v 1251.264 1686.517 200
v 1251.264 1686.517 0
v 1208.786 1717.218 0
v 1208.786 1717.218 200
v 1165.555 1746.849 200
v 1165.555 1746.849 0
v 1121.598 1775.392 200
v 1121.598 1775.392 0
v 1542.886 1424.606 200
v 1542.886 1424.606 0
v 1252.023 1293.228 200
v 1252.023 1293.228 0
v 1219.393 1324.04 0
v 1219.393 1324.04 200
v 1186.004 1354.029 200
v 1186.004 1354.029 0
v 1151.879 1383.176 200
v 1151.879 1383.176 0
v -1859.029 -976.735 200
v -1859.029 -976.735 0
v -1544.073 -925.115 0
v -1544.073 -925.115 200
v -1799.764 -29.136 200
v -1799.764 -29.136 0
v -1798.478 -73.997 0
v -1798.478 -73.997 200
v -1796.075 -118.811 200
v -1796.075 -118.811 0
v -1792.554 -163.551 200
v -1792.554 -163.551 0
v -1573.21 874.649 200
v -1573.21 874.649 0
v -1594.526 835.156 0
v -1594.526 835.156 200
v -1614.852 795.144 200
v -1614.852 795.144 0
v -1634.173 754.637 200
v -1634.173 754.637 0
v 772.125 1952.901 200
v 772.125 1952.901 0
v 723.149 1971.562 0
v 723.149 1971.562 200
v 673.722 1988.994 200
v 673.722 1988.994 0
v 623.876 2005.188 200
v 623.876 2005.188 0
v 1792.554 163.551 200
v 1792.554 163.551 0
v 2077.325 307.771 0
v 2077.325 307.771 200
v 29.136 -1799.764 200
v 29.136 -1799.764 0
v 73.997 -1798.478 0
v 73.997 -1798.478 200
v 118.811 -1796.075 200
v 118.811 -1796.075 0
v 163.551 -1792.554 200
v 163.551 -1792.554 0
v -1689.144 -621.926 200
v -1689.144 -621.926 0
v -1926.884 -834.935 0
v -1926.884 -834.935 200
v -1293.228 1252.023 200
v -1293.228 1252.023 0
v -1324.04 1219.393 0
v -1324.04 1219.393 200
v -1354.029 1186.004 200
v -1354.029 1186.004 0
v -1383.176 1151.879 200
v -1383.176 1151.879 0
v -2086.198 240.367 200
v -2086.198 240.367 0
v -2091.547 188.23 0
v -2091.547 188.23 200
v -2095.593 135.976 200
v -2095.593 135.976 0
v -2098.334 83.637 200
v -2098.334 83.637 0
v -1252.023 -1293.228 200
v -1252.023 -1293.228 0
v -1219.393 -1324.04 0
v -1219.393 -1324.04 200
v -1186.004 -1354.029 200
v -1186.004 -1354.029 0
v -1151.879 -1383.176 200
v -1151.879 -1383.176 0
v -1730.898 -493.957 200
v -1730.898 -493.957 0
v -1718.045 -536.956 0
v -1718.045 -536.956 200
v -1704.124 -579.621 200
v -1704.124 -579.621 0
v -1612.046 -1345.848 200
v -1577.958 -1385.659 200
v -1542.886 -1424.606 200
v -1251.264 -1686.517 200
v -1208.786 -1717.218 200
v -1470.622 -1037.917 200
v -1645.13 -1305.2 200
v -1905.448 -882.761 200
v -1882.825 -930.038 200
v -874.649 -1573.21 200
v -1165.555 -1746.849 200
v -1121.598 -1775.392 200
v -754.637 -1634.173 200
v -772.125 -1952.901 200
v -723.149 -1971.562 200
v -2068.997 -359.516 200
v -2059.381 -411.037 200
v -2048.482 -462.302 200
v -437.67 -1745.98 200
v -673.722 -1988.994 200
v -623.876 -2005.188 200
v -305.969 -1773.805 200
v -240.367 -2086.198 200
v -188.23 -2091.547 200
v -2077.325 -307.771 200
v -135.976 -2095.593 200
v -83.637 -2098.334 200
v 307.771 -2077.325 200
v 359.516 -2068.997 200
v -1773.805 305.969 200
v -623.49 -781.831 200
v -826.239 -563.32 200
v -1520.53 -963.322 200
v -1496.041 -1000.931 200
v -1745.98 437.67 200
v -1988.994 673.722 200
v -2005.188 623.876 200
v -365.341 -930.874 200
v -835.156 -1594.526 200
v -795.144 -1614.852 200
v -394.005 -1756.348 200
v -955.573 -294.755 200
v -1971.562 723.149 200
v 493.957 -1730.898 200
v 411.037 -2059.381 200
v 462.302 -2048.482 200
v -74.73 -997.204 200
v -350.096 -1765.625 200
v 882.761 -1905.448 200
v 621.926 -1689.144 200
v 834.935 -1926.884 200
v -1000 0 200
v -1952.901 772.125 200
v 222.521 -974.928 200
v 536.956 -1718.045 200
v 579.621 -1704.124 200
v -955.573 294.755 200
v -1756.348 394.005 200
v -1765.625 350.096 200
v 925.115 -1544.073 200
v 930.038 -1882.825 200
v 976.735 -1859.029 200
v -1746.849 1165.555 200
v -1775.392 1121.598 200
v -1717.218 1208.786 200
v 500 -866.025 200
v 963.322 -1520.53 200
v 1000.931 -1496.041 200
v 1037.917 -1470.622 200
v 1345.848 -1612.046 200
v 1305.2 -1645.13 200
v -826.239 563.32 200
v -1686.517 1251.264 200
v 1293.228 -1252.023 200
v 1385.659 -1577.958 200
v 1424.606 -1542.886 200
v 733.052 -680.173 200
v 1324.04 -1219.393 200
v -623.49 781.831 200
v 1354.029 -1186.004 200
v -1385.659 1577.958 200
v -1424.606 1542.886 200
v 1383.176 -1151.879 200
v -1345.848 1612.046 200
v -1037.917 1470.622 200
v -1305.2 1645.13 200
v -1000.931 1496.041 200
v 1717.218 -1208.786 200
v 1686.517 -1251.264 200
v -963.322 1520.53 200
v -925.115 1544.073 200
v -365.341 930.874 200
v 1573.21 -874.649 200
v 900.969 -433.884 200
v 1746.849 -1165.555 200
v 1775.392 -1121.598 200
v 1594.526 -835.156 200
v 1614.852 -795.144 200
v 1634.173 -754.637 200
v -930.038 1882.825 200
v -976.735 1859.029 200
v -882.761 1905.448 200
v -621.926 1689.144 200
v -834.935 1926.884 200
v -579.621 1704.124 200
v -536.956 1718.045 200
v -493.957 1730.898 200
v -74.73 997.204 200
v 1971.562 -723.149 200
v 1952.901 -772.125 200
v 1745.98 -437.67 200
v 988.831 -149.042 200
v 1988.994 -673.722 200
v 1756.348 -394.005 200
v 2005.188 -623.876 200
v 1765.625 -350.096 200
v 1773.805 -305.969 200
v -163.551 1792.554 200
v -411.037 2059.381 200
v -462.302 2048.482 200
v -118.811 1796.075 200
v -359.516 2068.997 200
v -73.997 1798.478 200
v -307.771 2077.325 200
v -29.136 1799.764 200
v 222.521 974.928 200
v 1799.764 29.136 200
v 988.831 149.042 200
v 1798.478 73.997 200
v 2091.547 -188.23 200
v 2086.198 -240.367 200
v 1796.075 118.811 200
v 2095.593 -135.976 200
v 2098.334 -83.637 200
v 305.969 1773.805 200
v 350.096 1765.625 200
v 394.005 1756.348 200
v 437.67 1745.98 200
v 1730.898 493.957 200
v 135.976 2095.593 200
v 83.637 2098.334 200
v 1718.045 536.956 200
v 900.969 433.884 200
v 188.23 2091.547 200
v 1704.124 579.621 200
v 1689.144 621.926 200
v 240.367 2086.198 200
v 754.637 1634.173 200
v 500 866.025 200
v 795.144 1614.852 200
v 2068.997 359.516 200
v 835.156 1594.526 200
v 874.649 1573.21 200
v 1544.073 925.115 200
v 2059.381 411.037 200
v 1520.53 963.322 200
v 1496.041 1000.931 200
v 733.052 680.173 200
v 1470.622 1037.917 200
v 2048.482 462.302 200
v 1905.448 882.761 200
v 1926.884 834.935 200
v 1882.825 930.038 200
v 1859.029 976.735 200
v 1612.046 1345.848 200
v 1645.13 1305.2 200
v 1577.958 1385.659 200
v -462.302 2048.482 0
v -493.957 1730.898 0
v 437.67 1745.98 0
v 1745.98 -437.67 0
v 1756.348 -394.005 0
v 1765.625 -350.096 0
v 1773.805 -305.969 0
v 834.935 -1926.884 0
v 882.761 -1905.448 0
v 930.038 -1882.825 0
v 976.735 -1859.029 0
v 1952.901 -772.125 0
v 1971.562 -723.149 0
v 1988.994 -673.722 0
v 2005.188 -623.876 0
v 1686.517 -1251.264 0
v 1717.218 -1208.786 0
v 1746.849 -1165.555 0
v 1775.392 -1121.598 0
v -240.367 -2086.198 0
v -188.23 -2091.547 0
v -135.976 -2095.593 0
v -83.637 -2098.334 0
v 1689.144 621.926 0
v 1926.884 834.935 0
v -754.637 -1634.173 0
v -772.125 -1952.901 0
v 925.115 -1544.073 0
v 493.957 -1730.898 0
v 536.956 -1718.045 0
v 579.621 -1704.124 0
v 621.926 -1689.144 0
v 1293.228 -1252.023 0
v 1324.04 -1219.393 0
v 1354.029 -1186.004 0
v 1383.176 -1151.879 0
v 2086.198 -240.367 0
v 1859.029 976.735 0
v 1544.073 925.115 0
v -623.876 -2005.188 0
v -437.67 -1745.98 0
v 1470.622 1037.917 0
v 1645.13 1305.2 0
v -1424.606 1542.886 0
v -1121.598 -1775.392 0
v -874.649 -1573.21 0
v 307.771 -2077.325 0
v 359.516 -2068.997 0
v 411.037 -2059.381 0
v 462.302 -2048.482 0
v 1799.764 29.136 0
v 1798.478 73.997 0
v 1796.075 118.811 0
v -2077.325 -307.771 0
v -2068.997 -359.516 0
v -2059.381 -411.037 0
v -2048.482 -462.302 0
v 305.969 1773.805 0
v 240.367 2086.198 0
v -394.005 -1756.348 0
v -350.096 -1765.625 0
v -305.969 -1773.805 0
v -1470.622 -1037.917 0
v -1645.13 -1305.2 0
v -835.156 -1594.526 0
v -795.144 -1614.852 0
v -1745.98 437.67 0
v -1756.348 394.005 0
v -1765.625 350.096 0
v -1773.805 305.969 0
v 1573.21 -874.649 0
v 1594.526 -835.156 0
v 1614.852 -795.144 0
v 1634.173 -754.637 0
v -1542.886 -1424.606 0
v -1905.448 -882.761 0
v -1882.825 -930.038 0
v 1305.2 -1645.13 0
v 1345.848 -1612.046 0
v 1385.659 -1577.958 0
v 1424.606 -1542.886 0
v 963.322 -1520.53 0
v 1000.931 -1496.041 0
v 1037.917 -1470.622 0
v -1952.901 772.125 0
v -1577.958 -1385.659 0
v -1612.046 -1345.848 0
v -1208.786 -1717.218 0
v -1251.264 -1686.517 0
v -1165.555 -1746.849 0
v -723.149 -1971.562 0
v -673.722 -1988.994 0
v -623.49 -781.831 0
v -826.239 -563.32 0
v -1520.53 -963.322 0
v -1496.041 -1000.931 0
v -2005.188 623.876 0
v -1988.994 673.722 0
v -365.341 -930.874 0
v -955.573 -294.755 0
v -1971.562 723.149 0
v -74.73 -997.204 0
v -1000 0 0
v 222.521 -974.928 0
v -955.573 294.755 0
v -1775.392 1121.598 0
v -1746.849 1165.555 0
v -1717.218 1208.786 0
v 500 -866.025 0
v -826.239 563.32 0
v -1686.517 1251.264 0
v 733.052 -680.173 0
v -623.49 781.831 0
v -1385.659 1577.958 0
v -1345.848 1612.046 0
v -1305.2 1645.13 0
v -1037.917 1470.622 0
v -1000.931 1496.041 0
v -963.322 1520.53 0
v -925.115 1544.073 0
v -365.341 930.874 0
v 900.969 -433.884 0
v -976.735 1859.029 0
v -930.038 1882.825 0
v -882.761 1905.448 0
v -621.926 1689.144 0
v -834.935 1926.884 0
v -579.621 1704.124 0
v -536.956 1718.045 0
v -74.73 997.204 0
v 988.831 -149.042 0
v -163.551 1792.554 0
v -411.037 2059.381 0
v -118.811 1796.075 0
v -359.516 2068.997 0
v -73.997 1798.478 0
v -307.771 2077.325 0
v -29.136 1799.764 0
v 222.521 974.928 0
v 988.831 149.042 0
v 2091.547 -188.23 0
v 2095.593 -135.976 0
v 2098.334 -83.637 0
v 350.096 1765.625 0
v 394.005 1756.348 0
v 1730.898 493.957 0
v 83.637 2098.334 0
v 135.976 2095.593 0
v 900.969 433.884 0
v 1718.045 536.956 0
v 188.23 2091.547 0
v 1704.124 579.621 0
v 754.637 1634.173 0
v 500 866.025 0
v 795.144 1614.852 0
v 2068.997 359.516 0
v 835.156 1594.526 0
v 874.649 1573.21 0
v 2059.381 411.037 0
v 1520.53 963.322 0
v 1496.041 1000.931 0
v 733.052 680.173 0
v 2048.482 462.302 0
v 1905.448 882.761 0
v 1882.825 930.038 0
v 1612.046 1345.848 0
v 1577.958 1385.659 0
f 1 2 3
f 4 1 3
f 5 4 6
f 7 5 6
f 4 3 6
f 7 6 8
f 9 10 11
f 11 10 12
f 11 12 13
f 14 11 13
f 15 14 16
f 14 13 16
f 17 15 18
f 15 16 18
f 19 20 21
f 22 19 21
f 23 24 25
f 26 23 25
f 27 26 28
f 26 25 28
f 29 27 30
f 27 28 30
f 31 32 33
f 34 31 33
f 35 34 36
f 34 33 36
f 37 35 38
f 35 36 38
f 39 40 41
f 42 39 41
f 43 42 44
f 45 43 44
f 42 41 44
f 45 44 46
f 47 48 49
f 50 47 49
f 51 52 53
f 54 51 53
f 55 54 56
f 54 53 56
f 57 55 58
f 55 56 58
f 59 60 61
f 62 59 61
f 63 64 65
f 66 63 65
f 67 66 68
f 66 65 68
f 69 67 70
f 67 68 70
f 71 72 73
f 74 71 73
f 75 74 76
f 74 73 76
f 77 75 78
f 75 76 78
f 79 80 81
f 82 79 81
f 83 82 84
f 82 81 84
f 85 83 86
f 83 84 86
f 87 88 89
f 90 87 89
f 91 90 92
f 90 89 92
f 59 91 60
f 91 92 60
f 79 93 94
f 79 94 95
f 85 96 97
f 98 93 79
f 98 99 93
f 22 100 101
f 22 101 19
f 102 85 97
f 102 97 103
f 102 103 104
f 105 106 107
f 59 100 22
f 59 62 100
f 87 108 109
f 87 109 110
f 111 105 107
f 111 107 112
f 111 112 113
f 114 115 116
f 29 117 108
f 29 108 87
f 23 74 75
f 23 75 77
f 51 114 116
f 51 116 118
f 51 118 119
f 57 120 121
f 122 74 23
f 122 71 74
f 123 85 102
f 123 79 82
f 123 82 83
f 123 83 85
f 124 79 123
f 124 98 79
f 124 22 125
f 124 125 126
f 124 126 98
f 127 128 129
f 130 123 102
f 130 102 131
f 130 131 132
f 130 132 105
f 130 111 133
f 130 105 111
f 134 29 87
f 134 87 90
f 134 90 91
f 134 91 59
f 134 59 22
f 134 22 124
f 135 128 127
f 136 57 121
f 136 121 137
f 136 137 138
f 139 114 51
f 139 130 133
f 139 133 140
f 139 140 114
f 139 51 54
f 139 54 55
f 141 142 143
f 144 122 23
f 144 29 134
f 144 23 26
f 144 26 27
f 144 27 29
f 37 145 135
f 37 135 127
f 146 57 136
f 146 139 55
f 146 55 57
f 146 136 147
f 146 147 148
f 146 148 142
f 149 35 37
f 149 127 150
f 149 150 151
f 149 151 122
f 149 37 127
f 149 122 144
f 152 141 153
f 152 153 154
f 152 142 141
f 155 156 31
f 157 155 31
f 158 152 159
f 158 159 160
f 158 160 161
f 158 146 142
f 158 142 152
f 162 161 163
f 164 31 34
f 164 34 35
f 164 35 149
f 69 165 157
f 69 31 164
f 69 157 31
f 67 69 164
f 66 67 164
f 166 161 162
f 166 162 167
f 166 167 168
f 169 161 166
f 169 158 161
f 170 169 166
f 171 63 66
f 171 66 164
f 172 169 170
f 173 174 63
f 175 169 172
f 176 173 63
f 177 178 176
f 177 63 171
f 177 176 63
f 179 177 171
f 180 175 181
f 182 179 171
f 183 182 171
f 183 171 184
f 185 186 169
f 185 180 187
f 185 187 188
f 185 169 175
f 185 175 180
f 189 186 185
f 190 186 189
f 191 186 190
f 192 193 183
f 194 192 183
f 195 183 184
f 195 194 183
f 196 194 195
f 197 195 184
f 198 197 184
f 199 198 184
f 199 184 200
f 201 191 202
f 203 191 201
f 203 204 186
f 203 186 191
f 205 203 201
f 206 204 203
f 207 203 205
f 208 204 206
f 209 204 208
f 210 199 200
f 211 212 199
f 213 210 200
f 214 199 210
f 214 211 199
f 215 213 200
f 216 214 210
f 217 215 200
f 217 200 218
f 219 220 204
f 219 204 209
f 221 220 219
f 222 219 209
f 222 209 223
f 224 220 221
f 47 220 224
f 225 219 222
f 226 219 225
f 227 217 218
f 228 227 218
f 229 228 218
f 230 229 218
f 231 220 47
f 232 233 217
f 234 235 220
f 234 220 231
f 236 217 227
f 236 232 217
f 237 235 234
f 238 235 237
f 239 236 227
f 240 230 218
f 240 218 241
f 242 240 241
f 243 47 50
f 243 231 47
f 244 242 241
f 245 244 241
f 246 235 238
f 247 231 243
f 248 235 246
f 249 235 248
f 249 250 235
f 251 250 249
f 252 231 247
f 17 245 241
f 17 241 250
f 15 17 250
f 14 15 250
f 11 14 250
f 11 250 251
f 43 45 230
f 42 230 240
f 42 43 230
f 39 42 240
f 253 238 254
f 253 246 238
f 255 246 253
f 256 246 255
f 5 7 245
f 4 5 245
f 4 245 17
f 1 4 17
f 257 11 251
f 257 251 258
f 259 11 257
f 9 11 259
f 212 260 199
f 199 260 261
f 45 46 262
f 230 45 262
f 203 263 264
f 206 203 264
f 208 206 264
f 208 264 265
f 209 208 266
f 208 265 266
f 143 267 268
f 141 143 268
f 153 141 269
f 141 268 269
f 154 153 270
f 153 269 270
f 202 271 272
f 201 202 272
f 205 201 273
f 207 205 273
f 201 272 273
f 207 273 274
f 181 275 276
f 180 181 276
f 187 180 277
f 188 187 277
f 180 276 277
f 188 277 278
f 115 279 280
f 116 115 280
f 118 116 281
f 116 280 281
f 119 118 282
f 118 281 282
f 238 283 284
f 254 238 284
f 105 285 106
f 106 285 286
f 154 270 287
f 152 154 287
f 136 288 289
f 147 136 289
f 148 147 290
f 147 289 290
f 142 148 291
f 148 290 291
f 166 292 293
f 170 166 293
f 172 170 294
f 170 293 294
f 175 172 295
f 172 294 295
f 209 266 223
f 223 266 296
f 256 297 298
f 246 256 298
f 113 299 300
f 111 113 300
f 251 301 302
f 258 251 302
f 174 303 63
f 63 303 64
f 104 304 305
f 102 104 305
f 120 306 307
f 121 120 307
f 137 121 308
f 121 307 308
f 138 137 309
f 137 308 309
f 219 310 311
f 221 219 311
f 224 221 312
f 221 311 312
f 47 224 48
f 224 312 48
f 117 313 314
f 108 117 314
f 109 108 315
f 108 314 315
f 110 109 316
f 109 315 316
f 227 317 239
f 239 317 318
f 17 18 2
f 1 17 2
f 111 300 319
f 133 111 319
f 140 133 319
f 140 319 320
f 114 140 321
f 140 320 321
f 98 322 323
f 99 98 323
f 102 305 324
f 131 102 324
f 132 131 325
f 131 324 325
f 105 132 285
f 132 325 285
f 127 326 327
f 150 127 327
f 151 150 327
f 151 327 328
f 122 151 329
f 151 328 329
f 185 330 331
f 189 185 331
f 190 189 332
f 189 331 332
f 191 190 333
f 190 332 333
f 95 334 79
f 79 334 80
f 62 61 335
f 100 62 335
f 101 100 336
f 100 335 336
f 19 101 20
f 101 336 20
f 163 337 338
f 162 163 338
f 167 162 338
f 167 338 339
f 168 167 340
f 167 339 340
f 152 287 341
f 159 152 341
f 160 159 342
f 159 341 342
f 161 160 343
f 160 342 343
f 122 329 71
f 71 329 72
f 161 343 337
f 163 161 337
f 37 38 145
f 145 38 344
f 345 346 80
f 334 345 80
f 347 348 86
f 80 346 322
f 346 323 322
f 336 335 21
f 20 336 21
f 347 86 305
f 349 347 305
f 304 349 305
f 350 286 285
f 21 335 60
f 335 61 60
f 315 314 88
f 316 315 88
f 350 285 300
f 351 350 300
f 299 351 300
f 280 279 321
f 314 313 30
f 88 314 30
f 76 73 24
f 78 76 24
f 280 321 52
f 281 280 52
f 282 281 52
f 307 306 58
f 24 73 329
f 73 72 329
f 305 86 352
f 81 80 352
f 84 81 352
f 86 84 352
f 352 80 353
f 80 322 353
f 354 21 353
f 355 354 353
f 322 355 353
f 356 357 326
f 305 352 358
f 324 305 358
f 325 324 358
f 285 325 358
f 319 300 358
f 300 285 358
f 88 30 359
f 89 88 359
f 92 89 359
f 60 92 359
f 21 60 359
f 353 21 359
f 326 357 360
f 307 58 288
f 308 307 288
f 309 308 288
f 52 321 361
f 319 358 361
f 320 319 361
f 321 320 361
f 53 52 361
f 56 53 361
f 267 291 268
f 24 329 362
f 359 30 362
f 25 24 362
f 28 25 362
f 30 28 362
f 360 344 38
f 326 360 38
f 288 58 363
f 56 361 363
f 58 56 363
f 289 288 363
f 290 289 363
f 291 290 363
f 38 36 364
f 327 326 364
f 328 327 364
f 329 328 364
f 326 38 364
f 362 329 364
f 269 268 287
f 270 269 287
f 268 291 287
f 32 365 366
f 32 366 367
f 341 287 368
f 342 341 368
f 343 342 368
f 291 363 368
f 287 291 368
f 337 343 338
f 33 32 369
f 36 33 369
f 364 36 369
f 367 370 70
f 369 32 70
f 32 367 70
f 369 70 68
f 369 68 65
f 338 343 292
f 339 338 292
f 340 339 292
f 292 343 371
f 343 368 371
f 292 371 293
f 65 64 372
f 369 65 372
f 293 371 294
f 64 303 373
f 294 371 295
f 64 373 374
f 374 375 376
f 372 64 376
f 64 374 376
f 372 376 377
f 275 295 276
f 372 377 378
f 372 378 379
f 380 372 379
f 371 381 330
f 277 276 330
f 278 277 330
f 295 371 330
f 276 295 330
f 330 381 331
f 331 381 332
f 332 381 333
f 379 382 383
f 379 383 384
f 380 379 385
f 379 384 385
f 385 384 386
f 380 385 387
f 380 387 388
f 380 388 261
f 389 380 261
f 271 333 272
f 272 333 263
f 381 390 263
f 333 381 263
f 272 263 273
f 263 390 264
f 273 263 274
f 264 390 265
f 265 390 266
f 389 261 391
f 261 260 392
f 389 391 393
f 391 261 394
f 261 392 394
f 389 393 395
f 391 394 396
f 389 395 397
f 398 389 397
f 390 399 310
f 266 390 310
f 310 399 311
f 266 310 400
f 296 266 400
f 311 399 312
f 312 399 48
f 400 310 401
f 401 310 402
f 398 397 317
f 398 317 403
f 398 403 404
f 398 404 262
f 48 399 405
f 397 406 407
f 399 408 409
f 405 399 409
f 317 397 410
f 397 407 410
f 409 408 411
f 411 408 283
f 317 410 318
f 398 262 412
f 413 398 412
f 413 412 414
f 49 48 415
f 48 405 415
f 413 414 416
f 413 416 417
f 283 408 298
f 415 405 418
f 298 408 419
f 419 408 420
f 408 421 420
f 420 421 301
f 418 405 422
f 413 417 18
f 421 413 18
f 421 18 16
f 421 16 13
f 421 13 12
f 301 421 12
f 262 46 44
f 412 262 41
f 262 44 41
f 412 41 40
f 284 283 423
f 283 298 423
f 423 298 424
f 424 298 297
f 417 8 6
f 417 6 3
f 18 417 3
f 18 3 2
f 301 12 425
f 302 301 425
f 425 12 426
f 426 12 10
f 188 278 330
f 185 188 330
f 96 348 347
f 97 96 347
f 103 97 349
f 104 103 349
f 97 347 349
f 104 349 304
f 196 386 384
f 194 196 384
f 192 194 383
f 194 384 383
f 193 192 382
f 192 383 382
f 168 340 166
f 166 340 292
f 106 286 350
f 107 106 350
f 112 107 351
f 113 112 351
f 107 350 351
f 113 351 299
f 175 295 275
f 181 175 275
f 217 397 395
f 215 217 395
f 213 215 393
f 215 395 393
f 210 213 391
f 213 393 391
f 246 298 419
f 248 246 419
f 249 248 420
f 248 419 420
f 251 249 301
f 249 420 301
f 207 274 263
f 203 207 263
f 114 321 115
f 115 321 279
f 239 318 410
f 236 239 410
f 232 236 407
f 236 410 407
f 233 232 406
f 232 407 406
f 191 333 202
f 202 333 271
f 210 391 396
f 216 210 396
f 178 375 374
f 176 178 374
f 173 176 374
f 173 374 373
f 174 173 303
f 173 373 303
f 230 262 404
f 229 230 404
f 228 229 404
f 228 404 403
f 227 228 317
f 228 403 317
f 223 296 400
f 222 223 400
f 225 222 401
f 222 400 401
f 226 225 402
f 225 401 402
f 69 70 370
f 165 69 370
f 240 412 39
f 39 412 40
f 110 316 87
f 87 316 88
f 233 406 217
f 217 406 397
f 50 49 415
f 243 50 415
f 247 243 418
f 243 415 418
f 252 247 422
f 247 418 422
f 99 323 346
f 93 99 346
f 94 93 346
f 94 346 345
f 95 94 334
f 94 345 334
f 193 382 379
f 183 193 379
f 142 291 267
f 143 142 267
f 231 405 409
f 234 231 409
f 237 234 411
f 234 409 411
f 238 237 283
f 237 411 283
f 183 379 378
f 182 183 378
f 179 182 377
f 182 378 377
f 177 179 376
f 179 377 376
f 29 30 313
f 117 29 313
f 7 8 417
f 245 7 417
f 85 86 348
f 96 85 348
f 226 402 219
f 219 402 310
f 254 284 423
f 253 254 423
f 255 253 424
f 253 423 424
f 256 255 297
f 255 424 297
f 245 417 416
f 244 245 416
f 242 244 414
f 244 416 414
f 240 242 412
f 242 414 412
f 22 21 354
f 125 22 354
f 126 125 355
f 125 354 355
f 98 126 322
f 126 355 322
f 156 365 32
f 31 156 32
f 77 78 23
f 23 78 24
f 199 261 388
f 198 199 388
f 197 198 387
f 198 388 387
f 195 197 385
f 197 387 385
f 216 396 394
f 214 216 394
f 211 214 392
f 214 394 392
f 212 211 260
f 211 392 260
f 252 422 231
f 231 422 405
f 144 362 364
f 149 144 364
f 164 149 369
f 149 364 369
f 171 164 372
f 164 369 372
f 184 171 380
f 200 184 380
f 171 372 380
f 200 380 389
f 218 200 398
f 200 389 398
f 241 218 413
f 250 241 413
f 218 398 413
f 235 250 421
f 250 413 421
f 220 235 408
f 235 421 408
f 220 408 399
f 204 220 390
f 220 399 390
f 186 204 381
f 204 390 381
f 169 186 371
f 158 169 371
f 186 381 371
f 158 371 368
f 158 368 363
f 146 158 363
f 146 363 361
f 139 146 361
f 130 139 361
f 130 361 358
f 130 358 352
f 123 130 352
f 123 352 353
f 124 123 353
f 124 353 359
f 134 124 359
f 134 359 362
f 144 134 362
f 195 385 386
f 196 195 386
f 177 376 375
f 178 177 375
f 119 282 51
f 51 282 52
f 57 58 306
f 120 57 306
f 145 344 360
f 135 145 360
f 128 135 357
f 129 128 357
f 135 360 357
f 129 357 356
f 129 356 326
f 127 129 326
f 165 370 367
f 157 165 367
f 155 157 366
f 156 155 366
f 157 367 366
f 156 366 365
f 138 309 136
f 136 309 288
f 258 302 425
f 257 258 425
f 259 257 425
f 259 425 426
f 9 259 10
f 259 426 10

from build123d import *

# Parameters (mm, degrees)
EXTRUDE_1_DEPTH     = 200
SKETCH_2_R          = 1000
CUT_EXTRUDE_1_DEPTH = 2975.224241243


with BuildPart() as part:
    # 草图1 → 凸台-拉伸1 (new body)
    with BuildSketch(Plane.XY):
        with BuildLine():
            Line((-462.302006573, 2048.481597359), (-493.956815672, 1730.89764696))
            ThreePointArc((-493.956815672, 1730.89764696), (-558.331724226, 1711.217603265), (-621.925755378, 1689.144267017))
            Line((-621.925755378, 1689.144267017), (-834.934829889, 1926.884487933))
            ThreePointArc((-834.934829889, 1926.884487933), (-906.470322883, 1894.283915819), (-976.735498633, 1859.028715677))
            Line((-976.735498633, 1859.028715677), (-925.114921486, 1544.073308507))
            ThreePointArc((-925.114921486, 1544.073308507), (-982.202738106, 1508.402393679), (-1037.916855383, 1470.621841709))
            Line((-1037.916855383, 1470.621841709), (-1305.199518648, 1645.130455776))
            ThreePointArc((-1305.199518648, 1645.130455776), (-1365.859849883, 1595.125973231), (-1424.606080592, 1542.886099211))
            Line((-1424.606080592, 1542.886099211), (-1293.227974224, 1252.022925782))
            ThreePointArc((-1293.227974224, 1252.022925782), (-1339.138258551, 1202.792053717), (-1383.175636934, 1151.878968205))
            Line((-1383.175636934, 1151.878968205), (-1686.517017155, 1251.263501764))
            ThreePointArc((-1686.517017155, 1251.263501764), (-1732.168285303, 1187.262831638), (-1775.392112432, 1121.598344825))
            Line((-1775.392112432, 1121.598344825), (-1573.20967768, 874.64924973))
            ThreePointArc((-1573.20967768, 874.64924973), (-1604.813719706, 815.213423002), (-1634.173284633, 754.637446588))
            Line((-1634.173284633, 754.637446588), (-1952.901168044, 772.125007918))
            ThreePointArc((-1952.901168044, 772.125007918), (-1980.432314624, 698.489690113), (-2005.188105784, 623.875516767))
            Line((-2005.188105784, 623.875516767), (-1745.979741454, 437.669672735))
            ThreePointArc((-1745.979741454, 437.669672735), (-1761.123777943, 372.079344714), (-1773.804723583, 305.968630084))
            Line((-1773.804723583, 305.968630084), (-2086.198331653, 240.367470778))
            ThreePointArc((-2086.198331653, 240.367470778), (-2093.733154521, 162.115630516), (-2098.333843457, 83.636603245))
            Line((-2098.333843457, 83.636603245), (-1799.764171216, -29.136369173))
            ThreePointArc((-1799.764171216, -29.136369173), (-1797.416161108, -96.411326027), (-1792.554301972, -163.551442924))
            Line((-1792.554301972, -163.551442924), (-2077.324526565, -307.770712268))
            ThreePointArc((-2077.324526565, -307.770712268), (-2064.349539996, -385.306341392), (-2048.481597359, -462.302006573))
            Line((-2048.481597359, -462.302006573), (-1730.89764696, -493.956815672))
            ThreePointArc((-1730.89764696, -493.956815672), (-1711.217603265, -558.331724226), (-1689.144267017, -621.925755378))
            Line((-1689.144267017, -621.925755378), (-1926.884487933, -834.934829889))
            ThreePointArc((-1926.884487933, -834.934829889), (-1894.283915819, -906.470322883), (-1859.028715677, -976.735498633))
            Line((-1859.028715677, -976.735498633), (-1544.073308507, -925.114921486))
            ThreePointArc((-1544.073308507, -925.114921486), (-1508.402393679, -982.202738106), (-1470.621841709, -1037.916855383))
            Line((-1470.621841709, -1037.916855383), (-1645.130455776, -1305.199518648))
            ThreePointArc((-1645.130455776, -1305.199518648), (-1595.125973231, -1365.859849883), (-1542.886099211, -1424.606080592))
            Line((-1542.886099211, -1424.606080592), (-1252.022925782, -1293.227974224))
            ThreePointArc((-1252.022925782, -1293.227974224), (-1202.792053717, -1339.138258551), (-1151.878968205, -1383.175636934))
            Line((-1151.878968205, -1383.175636934), (-1251.263501764, -1686.517017155))
            ThreePointArc((-1251.263501764, -1686.517017155), (-1187.262831638, -1732.168285303), (-1121.598344825, -1775.392112432))
            Line((-1121.598344825, -1775.392112432), (-874.64924973, -1573.20967768))
            ThreePointArc((-874.64924973, -1573.20967768), (-815.213423002, -1604.813719706), (-754.637446588, -1634.173284633))
            Line((-754.637446588, -1634.173284633), (-772.125007918, -1952.901168044))
            ThreePointArc((-772.125007918, -1952.901168044), (-698.489690113, -1980.432314624), (-623.875516767, -2005.188105784))
            Line((-623.875516767, -2005.188105784), (-437.669672735, -1745.979741454))
            ThreePointArc((-437.669672735, -1745.979741454), (-372.079344714, -1761.123777943), (-305.968630084, -1773.804723583))
            Line((-305.968630084, -1773.804723583), (-240.367470778, -2086.198331653))
            ThreePointArc((-240.367470778, -2086.198331653), (-162.115630516, -2093.733154521), (-83.636603245, -2098.333843457))
            Line((-83.636603245, -2098.333843457), (29.136369173, -1799.764171216))
            ThreePointArc((29.136369173, -1799.764171216), (96.411326027, -1797.416161108), (163.551442924, -1792.554301972))
            Line((163.551442924, -1792.554301972), (307.770712268, -2077.324526565))
            ThreePointArc((307.770712268, -2077.324526565), (385.306341392, -2064.349539996), (462.302006573, -2048.481597359))
            Line((462.302006573, -2048.481597359), (493.956815672, -1730.89764696))
            ThreePointArc((493.956815672, -1730.89764696), (558.331724226, -1711.217603265), (621.925755378, -1689.144267017))
            Line((621.925755378, -1689.144267017), (834.934829889, -1926.884487933))
            ThreePointArc((834.934829889, -1926.884487933), (906.470322883, -1894.283915819), (976.735498633, -1859.028715677))
            Line((976.735498633, -1859.028715677), (925.114921486, -1544.073308507))
            ThreePointArc((925.114921486, -1544.073308507), (982.202738106, -1508.402393679), (1037.916855383, -1470.621841709))
            Line((1037.916855383, -1470.621841709), (1305.199518648, -1645.130455776))
            ThreePointArc((1305.199518648, -1645.130455776), (1365.859849883, -1595.125973231), (1424.606080592, -1542.886099211))
            Line((1424.606080592, -1542.886099211), (1293.227974224, -1252.022925782))
            ThreePointArc((1293.227974224, -1252.022925782), (1339.138258551, -1202.792053717), (1383.175636934, -1151.878968205))
            Line((1383.175636934, -1151.878968205), (1686.517017155, -1251.263501764))
            ThreePointArc((1686.517017155, -1251.263501764), (1732.168285303, -1187.262831638), (1775.392112432, -1121.598344825))
            Line((1775.392112432, -1121.598344825), (1573.20967768, -874.64924973))
            ThreePointArc((1573.20967768, -874.64924973), (1604.813719706, -815.213423002), (1634.173284633, -754.637446588))
            Line((1634.173284633, -754.637446588), (1952.901168044, -772.125007918))
            ThreePointArc((1952.901168044, -772.125007918), (1980.432314624, -698.489690113), (2005.188105784, -623.875516767))
            Line((2005.188105784, -623.875516767), (1745.979741454, -437.669672735))
            ThreePointArc((1745.979741454, -437.669672735), (1761.123777943, -372.079344714), (1773.804723583, -305.968630084))
            Line((1773.804723583, -305.968630084), (2086.198331653, -240.367470778))
            ThreePointArc((2086.198331653, -240.367470778), (2093.733154521, -162.115630516), (2098.333843457, -83.636603245))
            Line((2098.333843457, -83.636603245), (1799.764171216, 29.136369173))
            ThreePointArc((1799.764171216, 29.136369173), (1797.416161108, 96.411326027), (1792.554301972, 163.551442924))
            Line((1792.554301972, 163.551442924), (2077.324526565, 307.770712268))
            ThreePointArc((2077.324526565, 307.770712268), (2064.349539996, 385.306341392), (2048.481597359, 462.302006573))
            Line((2048.481597359, 462.302006573), (1730.89764696, 493.956815672))
            ThreePointArc((1730.89764696, 493.956815672), (1711.217603265, 558.331724226), (1689.144267017, 621.925755378))
            Line((1689.144267017, 621.925755378), (1926.884487933, 834.934829889))
            ThreePointArc((1926.884487933, 834.934829889), (1894.283915819, 906.470322883), (1859.028715677, 976.735498633))
            Line((1859.028715677, 976.735498633), (1544.073308507, 925.114921486))
            ThreePointArc((1544.073308507, 925.114921486), (1508.402393679, 982.202738106), (1470.621841709, 1037.916855383))
            Line((1470.621841709, 1037.916855383), (1645.130455776, 1305.199518648))
            ThreePointArc((1645.130455776, 1305.199518648), (1595.125973231, 1365.859849883), (1542.886099211, 1424.606080592))
            Line((1542.886099211, 1424.606080592), (1252.022925782, 1293.227974224))
            ThreePointArc((1252.022925782, 1293.227974224), (1202.792053717, 1339.138258551), (1151.878968205, 1383.175636934))
            Line((1151.878968205, 1383.175636934), (1251.263501764, 1686.517017155))
            ThreePointArc((1251.263501764, 1686.517017155), (1187.262831638, 1732.168285303), (1121.598344825, 1775.392112432))
            Line((1121.598344825, 1775.392112432), (874.64924973, 1573.20967768))
            ThreePointArc((874.64924973, 1573.20967768), (815.213423002, 1604.813719706), (754.637446588, 1634.173284633))
            Line((754.637446588, 1634.173284633), (772.125007918, 1952.901168044))
            ThreePointArc((772.125007918, 1952.901168044), (698.489690113, 1980.432314624), (623.875516767, 2005.188105784))
            Line((623.875516767, 2005.188105784), (437.669672735, 1745.979741454))
            ThreePointArc((437.669672735, 1745.979741454), (372.079344714, 1761.123777943), (305.968630084, 1773.804723583))
            Line((305.968630084, 1773.804723583), (240.367470778, 2086.198331653))
            ThreePointArc((240.367470778, 2086.198331653), (162.115630516, 2093.733154521), (83.636603245, 2098.333843457))
            Line((83.636603245, 2098.333843457), (-29.136369173, 1799.764171216))
            ThreePointArc((-29.136369173, 1799.764171216), (-96.411326027, 1797.416161108), (-163.551442924, 1792.554301972))
            Line((-163.551442924, 1792.554301972), (-307.770712268, 2077.324526565))
            ThreePointArc((-307.770712268, 2077.324526565), (-385.306341392, 2064.349539996), (-462.302006573, 2048.481597359))
        make_face()
    extrude(amount=EXTRUDE_1_DEPTH)

    # 草图2 → 切除-拉伸1 (cut, through all)
    with BuildSketch(Plane(origin=(0, 0, 0), x_dir=(-1, 0, 0), z_dir=(0, 0, -1))):
        Circle(SKETCH_2_R)
    extrude(amount=-CUT_EXTRUDE_1_DEPTH, mode=Mode.SUBTRACT)


solid = part.part
